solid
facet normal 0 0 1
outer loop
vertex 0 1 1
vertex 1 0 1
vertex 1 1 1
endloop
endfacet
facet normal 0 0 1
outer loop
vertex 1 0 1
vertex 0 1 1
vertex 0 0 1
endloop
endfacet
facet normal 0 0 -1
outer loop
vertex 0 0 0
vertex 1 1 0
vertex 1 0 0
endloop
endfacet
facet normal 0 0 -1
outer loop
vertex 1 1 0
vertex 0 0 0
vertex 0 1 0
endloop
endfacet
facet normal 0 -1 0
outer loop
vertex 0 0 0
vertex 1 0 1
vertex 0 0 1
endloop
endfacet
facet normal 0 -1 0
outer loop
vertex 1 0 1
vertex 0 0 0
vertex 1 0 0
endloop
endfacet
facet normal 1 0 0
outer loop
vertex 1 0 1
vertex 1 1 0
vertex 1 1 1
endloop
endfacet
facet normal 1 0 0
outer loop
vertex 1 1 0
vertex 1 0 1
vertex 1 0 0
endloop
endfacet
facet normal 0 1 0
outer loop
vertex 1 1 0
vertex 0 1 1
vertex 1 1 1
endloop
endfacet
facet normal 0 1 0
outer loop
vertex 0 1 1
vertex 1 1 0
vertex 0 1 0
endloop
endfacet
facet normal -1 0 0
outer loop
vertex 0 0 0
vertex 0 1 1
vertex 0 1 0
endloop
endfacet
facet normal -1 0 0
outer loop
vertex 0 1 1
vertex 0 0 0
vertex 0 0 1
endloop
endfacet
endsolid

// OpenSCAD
layout = [
    [[13.5, 1], 1.5, "Grey"],  // \
    //start ROW 3
    [[0, 2], 1.75, "Grey"]  //CapsLock
];

cube(1);
